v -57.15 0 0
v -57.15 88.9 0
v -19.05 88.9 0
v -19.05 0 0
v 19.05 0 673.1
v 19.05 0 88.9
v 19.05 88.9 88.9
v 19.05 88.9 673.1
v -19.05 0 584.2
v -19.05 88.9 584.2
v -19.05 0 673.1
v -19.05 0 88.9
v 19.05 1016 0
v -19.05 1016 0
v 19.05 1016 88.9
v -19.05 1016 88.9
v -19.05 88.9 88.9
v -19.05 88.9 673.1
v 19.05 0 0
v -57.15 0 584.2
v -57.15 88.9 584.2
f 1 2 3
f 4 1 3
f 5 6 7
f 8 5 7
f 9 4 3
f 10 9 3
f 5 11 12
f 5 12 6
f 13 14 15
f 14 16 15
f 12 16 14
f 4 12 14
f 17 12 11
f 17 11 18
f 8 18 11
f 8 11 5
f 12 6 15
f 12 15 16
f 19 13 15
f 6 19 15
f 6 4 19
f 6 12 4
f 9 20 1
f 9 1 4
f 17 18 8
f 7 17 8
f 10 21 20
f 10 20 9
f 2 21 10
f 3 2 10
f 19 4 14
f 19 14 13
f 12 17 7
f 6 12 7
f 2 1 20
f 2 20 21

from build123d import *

# Parameters (mm, degrees)
F1_DEPTH = 1016
F2_W     = 38.1
F2_H     = 88.9
F3_DEPTH = 584.2
F4_W     = 38.1
F4_H     = 88.9
F5_DEPTH = 584.2


with BuildPart() as f1:
    # F0 (on Front) → F1 (new body)
    with BuildSketch(Plane.XZ):
        Polygon((-19.05, 0), (0, 0), (19.05, 0), (19.05, 88.9), (-19.05, 88.9), align=None)
    extrude(amount=-F1_DEPTH)


with BuildPart() as f3:
    # F2 (on Top) → F3 (new body)
    with BuildSketch(Plane.XY):
        with Locations((-38.1, 44.45)):
            Rectangle(F2_W, F2_H)
    extrude(amount=F3_DEPTH)


with BuildPart() as f5:
    # F4 (on face) → F5 (new body)
    with BuildSketch(Plane.XY.offset(88.9)):
        with Locations((0, 44.45)):
            Rectangle(F4_W, F4_H)
    extrude(amount=F5_DEPTH)


solid = Compound([f1.part, f3.part, f5.part])
